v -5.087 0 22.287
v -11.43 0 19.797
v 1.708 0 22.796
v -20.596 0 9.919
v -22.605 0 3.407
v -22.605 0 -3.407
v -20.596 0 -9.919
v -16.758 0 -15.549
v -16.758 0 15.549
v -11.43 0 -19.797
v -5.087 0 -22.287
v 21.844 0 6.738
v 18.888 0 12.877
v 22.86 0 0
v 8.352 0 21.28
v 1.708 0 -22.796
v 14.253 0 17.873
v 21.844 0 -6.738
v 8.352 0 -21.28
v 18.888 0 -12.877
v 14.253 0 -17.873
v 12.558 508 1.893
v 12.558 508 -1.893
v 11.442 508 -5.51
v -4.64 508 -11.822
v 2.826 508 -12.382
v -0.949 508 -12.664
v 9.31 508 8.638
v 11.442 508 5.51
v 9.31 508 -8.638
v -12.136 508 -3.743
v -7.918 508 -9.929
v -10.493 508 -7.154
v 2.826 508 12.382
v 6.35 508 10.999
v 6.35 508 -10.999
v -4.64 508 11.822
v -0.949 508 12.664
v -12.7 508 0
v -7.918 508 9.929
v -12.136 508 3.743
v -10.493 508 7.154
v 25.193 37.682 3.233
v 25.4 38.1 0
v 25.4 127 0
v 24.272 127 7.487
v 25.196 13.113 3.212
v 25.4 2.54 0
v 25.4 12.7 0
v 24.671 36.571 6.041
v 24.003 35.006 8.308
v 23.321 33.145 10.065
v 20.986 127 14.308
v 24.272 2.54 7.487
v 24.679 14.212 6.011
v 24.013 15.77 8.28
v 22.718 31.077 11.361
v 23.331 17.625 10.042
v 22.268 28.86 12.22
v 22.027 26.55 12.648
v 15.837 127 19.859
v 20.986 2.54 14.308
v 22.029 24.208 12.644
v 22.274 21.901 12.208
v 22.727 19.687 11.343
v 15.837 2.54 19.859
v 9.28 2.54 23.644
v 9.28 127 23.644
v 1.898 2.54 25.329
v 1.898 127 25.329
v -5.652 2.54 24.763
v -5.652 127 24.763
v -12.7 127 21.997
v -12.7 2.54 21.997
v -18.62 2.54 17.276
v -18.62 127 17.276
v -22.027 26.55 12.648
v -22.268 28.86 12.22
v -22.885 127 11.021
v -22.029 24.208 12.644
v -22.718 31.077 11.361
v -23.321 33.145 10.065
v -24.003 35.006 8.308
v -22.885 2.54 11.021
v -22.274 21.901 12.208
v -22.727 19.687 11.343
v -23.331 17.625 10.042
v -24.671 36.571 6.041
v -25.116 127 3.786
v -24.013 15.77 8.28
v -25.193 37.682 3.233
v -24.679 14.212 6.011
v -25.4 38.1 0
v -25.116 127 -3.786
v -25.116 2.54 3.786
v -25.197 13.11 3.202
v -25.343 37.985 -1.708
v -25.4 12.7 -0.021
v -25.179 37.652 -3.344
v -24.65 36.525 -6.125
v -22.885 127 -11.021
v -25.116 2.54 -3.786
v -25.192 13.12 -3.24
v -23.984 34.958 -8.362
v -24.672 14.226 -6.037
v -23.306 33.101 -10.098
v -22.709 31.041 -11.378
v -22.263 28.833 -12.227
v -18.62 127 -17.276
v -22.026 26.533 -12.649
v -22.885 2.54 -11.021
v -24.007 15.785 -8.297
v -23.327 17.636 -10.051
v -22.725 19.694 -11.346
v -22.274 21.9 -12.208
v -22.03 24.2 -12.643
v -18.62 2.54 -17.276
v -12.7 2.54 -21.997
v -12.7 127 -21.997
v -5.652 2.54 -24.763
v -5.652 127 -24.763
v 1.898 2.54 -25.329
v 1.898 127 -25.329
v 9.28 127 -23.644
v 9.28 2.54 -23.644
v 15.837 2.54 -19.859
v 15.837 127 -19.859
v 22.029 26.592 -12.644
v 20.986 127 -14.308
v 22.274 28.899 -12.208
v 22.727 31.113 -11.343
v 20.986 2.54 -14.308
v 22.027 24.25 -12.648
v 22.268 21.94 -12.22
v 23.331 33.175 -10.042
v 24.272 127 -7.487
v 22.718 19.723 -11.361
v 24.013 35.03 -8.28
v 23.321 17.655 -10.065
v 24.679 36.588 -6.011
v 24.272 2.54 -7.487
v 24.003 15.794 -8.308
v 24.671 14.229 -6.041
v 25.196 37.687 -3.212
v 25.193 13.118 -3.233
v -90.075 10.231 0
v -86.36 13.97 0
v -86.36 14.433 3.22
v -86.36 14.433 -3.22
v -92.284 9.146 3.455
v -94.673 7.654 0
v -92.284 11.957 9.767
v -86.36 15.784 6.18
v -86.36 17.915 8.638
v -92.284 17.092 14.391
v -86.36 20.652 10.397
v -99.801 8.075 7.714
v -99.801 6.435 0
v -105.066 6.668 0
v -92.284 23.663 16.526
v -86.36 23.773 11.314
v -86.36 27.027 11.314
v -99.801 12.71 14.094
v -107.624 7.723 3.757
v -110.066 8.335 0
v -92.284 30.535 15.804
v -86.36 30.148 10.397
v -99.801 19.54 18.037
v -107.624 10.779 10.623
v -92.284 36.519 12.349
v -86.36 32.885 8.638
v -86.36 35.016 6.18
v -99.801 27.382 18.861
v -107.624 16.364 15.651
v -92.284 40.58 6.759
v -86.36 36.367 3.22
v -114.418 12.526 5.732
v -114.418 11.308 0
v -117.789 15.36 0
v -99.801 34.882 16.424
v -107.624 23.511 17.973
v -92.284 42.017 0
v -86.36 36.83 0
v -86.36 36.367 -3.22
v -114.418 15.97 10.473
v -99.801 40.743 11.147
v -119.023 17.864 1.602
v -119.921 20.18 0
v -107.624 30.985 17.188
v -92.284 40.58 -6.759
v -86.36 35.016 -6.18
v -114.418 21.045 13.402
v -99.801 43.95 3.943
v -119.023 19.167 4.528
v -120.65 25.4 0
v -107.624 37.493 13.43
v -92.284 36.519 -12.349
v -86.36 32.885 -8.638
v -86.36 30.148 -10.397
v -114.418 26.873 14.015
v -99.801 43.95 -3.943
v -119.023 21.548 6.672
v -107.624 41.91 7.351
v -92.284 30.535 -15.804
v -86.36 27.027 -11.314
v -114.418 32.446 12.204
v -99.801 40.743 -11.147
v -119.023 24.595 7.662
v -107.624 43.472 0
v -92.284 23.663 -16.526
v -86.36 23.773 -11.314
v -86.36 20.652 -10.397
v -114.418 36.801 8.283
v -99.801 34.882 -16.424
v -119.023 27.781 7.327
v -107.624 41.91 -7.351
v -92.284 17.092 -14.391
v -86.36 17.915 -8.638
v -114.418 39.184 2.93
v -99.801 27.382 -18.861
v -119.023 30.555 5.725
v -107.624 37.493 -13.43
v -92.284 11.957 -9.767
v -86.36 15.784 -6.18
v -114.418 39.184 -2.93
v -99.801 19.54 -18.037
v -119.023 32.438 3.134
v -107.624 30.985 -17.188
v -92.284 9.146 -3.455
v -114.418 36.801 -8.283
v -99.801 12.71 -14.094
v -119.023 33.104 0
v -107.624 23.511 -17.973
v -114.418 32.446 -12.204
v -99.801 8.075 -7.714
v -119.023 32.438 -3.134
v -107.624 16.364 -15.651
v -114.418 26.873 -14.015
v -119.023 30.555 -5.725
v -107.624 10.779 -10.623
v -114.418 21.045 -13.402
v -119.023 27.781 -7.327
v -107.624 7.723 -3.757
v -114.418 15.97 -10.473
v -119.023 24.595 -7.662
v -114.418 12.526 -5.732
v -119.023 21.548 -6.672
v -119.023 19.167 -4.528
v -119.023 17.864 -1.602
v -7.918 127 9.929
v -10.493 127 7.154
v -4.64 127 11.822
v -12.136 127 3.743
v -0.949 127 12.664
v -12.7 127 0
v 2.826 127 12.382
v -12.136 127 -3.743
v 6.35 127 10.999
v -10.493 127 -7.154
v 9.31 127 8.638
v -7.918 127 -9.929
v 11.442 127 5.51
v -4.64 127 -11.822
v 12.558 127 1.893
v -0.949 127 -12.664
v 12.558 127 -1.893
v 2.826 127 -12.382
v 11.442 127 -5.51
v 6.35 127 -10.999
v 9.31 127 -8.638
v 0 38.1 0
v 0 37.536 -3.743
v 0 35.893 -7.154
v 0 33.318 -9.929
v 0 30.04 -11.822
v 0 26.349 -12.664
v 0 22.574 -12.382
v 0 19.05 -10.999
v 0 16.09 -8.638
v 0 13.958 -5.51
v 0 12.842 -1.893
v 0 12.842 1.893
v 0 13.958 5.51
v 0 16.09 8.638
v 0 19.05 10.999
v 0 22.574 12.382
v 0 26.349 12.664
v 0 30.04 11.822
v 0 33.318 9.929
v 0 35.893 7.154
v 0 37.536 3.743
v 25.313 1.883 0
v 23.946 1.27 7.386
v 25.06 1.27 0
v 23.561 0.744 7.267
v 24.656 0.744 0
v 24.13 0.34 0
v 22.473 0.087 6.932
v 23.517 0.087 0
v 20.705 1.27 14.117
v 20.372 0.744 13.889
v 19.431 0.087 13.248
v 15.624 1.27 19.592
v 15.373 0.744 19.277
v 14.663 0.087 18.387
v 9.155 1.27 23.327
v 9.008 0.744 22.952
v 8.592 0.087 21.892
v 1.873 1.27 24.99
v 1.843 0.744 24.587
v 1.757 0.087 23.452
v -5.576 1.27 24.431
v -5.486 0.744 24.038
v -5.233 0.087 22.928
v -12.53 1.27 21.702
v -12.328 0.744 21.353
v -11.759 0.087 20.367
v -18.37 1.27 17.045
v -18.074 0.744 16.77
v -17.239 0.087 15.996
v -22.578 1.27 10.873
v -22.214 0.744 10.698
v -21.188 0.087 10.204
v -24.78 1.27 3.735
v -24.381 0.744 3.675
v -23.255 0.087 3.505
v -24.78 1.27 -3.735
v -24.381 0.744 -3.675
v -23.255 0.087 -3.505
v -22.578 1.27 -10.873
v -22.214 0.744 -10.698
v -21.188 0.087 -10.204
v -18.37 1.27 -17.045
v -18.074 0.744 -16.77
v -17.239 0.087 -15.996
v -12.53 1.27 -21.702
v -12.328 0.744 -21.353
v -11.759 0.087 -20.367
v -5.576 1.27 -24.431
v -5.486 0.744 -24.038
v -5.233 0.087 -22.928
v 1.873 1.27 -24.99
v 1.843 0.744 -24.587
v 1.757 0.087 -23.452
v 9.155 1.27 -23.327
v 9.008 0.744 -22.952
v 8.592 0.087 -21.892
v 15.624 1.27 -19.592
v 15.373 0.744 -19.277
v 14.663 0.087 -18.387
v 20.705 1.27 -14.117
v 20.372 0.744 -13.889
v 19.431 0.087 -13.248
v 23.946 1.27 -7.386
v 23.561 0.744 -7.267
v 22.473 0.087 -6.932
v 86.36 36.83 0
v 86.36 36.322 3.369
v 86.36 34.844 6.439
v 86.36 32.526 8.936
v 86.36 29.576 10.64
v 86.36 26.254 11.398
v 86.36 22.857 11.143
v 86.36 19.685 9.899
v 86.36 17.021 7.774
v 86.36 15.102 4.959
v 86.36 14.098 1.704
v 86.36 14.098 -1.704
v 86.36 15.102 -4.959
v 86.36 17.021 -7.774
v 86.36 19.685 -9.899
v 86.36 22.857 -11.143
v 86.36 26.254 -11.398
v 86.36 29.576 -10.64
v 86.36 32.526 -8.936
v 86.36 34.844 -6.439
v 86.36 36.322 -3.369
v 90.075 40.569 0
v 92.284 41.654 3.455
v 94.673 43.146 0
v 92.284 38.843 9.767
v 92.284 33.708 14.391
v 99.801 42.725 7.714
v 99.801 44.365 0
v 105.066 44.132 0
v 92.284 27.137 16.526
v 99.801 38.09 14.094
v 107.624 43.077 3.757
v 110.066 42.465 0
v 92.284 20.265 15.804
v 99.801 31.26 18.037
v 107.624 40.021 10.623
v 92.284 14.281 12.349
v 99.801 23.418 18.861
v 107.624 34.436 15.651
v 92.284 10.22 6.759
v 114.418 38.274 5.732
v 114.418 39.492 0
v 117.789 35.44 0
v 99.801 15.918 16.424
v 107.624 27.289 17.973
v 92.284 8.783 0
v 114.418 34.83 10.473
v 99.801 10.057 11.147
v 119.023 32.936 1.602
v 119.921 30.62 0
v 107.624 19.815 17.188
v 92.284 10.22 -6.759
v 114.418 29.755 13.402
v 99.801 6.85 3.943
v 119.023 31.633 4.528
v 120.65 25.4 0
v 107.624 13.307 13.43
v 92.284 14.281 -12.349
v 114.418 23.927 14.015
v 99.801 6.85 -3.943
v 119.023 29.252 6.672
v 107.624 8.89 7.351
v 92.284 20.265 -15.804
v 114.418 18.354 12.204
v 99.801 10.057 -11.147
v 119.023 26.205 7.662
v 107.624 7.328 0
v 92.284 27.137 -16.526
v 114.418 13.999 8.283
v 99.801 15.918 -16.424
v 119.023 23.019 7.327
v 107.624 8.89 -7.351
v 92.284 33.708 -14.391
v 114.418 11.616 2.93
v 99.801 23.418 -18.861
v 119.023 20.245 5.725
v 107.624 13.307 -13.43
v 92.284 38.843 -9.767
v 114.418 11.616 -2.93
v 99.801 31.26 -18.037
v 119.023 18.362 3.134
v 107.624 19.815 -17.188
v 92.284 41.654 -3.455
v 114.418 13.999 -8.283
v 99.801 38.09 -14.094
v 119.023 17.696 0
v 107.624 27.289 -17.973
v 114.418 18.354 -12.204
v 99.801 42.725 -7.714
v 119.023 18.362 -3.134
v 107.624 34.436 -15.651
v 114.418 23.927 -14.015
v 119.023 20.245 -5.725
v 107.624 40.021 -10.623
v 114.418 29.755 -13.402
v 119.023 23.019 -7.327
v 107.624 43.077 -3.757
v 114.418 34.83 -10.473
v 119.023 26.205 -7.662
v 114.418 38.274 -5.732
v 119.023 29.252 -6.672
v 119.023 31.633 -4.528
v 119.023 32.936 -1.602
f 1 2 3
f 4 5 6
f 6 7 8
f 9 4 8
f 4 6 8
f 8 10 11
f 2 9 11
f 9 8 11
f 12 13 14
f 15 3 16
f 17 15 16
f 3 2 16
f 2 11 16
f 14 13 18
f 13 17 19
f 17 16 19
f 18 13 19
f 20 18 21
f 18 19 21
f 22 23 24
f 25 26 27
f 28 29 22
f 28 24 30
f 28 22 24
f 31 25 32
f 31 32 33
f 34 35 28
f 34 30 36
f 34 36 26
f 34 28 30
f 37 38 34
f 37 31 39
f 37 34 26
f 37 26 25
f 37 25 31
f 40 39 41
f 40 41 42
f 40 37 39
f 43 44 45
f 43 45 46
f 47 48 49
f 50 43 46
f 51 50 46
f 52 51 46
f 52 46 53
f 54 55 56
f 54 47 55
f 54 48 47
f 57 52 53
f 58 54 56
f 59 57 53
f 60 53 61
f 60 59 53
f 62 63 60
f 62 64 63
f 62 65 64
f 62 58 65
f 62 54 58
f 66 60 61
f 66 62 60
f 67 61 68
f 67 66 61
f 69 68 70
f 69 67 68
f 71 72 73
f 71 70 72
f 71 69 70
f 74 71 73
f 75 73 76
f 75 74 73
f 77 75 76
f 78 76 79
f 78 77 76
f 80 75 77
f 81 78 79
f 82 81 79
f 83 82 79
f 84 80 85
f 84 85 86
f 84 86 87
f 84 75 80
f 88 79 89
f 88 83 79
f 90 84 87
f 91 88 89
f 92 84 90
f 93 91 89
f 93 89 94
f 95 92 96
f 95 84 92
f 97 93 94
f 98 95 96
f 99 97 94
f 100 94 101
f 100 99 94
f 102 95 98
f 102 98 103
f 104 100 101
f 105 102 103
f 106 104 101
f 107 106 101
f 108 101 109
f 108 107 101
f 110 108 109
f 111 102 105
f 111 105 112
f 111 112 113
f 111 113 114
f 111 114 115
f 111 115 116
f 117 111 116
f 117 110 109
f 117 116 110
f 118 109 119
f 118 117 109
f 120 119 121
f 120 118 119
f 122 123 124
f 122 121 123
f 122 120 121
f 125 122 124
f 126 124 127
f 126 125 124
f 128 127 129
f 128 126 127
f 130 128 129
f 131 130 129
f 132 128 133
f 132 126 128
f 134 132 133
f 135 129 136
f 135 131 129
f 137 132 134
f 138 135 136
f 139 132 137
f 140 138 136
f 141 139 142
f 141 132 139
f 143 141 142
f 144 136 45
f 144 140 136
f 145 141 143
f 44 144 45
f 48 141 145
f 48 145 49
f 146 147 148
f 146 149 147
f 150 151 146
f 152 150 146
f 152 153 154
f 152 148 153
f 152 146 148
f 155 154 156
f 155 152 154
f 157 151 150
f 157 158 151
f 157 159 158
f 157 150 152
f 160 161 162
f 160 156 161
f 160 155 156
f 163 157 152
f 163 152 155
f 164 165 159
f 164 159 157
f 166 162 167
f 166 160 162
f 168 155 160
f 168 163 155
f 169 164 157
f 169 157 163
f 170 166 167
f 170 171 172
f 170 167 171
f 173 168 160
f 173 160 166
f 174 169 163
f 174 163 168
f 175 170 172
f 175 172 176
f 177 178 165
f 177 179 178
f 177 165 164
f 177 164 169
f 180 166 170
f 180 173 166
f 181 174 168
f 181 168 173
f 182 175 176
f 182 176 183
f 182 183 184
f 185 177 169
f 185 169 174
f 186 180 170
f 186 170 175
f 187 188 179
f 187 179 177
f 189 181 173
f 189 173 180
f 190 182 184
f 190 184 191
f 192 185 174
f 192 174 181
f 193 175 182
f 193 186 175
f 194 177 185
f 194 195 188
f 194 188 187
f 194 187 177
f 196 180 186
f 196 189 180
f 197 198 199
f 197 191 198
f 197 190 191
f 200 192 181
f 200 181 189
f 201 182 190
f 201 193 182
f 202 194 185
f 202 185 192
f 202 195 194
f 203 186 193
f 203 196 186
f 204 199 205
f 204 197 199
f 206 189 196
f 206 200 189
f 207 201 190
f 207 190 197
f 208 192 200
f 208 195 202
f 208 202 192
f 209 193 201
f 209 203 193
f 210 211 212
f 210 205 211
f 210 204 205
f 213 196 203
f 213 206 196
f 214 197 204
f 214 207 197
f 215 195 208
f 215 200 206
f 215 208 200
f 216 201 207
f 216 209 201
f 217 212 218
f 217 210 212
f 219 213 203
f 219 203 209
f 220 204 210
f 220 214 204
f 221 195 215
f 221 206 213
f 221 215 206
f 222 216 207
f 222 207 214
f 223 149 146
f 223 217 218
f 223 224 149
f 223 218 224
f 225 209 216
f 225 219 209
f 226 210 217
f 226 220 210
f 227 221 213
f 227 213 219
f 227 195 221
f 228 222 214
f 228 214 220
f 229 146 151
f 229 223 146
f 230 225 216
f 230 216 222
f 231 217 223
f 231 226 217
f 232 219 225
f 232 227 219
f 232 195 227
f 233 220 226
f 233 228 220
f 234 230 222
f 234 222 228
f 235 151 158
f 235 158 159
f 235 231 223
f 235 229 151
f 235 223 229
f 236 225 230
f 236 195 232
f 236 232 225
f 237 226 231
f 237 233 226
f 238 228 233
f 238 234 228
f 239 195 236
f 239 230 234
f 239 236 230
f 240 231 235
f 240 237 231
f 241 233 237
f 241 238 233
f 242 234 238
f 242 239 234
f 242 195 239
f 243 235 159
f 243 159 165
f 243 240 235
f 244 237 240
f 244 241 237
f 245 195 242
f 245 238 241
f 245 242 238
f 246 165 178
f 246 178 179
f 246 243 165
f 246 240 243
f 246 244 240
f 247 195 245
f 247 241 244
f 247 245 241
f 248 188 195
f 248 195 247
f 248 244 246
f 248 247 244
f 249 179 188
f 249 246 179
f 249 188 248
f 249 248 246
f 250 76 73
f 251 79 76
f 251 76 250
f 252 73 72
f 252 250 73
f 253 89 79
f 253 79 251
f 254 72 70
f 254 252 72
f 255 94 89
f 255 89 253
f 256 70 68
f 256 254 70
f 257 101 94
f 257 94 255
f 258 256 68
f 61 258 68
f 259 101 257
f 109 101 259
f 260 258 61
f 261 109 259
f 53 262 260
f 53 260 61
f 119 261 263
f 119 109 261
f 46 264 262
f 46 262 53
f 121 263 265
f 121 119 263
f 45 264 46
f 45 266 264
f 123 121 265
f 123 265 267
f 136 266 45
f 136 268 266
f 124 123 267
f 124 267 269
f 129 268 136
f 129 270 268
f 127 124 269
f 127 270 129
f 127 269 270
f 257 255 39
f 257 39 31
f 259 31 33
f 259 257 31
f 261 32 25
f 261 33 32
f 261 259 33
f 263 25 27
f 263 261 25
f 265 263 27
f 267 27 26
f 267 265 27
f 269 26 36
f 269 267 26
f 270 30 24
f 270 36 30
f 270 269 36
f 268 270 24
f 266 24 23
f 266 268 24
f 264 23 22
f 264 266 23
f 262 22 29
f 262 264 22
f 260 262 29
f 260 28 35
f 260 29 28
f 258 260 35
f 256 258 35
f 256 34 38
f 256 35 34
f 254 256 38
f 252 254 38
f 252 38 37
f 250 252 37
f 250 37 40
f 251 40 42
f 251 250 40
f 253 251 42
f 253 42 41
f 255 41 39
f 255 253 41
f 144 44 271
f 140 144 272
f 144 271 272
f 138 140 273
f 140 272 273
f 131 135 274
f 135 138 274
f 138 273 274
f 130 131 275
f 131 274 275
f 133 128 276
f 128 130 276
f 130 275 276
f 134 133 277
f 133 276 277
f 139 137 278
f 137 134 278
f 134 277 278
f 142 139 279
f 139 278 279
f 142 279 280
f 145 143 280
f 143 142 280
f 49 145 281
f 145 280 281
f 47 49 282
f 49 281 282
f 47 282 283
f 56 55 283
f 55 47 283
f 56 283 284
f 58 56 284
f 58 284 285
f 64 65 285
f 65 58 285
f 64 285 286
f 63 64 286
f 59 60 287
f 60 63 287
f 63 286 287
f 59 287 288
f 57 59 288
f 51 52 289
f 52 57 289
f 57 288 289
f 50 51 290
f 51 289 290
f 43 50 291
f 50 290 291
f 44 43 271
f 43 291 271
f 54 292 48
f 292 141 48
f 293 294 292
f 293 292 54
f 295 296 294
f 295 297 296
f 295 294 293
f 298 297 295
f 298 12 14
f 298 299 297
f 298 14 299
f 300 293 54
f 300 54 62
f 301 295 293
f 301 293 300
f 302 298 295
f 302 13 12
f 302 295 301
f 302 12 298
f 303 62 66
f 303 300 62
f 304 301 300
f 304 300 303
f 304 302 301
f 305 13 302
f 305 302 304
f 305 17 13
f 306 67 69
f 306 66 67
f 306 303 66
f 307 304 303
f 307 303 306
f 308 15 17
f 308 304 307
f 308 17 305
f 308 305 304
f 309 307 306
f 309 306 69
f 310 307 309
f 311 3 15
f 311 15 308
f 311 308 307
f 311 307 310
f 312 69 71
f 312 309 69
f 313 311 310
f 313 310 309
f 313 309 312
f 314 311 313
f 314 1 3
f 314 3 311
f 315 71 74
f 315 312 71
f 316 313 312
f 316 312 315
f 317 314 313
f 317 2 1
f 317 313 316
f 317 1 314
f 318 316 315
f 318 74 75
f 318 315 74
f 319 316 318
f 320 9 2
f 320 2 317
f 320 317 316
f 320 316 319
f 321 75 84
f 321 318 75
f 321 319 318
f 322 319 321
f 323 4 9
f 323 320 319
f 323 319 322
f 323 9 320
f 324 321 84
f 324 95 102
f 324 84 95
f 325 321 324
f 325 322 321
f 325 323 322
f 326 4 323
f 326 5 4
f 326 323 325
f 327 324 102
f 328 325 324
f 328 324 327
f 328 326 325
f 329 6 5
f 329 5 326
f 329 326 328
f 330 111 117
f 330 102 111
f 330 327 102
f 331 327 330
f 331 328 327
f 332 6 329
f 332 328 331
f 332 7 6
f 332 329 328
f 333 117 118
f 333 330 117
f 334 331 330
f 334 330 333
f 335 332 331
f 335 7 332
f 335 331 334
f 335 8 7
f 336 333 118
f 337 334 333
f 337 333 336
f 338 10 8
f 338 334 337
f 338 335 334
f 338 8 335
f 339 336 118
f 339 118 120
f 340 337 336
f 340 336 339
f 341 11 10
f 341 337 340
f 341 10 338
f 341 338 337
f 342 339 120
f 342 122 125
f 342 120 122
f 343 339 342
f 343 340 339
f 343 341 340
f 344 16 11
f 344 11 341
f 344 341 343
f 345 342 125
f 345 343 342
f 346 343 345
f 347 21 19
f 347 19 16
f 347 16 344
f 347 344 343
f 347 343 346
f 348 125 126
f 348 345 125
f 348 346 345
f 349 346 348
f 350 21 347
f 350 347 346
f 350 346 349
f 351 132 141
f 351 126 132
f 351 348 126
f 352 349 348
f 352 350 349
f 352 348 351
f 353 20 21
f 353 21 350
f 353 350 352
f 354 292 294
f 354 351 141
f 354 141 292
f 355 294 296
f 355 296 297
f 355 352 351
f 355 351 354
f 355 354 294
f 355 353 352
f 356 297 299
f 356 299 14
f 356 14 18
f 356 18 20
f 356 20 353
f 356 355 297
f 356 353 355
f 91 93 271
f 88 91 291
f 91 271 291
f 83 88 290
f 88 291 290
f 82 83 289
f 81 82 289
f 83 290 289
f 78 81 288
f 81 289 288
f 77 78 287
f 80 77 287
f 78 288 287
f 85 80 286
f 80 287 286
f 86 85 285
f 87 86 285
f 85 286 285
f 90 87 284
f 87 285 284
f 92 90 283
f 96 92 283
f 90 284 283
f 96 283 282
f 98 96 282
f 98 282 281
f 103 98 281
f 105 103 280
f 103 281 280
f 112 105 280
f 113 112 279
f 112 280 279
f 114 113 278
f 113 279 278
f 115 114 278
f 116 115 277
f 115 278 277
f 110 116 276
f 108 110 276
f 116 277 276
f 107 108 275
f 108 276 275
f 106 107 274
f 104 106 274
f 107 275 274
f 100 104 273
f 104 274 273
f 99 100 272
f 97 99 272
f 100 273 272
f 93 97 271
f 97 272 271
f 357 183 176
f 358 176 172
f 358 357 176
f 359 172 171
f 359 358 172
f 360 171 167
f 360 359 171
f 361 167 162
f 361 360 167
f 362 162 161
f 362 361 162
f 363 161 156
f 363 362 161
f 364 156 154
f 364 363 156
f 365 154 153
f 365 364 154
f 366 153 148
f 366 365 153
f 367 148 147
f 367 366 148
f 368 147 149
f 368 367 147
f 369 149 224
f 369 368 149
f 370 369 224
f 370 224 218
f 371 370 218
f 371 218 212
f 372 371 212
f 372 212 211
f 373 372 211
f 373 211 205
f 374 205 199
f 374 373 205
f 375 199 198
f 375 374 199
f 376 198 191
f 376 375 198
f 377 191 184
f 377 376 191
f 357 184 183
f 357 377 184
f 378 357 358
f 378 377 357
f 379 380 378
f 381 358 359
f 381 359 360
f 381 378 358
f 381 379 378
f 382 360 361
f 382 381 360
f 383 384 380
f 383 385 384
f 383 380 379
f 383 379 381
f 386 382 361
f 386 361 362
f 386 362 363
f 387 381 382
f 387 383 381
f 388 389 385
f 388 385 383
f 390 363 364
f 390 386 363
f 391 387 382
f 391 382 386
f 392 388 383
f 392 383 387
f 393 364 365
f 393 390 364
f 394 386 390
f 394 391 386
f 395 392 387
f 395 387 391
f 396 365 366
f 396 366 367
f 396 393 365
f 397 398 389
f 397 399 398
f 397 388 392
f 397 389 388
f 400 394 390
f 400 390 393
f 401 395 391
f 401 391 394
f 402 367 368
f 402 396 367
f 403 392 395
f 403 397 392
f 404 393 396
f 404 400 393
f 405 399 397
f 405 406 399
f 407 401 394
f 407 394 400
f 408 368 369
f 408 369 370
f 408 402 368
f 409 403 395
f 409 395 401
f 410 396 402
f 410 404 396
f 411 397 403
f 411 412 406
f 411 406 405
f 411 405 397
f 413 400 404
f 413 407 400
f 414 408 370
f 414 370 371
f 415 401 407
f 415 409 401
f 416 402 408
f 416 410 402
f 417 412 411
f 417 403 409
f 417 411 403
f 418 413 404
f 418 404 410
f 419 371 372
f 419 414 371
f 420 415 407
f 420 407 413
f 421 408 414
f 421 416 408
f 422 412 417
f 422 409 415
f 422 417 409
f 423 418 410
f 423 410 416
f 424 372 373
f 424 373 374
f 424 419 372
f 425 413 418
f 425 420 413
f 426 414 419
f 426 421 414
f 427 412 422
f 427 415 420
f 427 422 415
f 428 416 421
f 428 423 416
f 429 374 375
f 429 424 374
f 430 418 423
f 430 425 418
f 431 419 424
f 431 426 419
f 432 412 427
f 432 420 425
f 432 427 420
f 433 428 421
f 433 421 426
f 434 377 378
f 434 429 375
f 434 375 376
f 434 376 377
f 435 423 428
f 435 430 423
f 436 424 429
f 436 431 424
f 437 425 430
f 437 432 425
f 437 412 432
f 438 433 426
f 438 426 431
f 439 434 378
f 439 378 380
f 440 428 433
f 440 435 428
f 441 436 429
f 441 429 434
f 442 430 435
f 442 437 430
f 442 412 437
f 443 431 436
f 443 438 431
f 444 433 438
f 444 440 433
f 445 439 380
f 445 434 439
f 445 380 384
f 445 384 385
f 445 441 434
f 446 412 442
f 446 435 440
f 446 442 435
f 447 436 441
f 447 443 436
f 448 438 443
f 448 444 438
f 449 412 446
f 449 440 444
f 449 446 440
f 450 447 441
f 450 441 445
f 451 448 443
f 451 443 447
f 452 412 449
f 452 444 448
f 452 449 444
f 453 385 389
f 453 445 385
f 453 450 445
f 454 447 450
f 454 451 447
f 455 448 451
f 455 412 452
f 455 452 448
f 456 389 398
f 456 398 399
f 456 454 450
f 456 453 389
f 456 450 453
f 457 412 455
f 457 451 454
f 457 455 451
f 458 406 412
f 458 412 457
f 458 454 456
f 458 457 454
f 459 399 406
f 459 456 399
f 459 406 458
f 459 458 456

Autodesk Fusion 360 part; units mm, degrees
sketch "Sketch1" plane through (0, 0, 0) normal (0, 1, 0) x (1, 0, 0)
  circle A0 centre (0, 0) radius 25.4
  dimension "d1" = 50.8
extrude "Extrude1" add sketch "Sketch1" along normal blind 127 makes body 1
sketch "Sketch3" plane through (0, 0, 0) normal (1, 0, 0) x (0, 1, 0)
  circle A0 centre (25.4, 0) radius 12.7
  dimension "d4" = 25.4
extrude "Extrude2" cut sketch "Sketch3" along normal through all and the other way through all bodies 1
sketch "Sketch4" plane through (0, 0, 0) normal (1, 0, 0) x (0, 1, 0)
  circle A0 centre (25.4, 0) radius 11.43
  dimension "d7" = 22.86
extrude "Extrude3" add sketch "Sketch4" along normal mid plane 203.2 separate body makes body 2
sphere "SpherePrimitive2" add diameter 38.1 placed x (0, -1, 0) y (0, 0, 1) z (-1, 0, 0) at (-101.6, 25.4, 0) bodies 2
sphere "SpherePrimitive1" add diameter 38.1 placed x (0, 1, 0) y (0, 0, 1) z (1, 0, 0) at (101.6, 25.4, 0) bodies 2
fillet "Fillet1" radius 2.54 1 edges at (-23.6811, 0, 9.185) on bodies 1
sketch "Sketch7" plane through (0, 127, 0) normal (0, 1, 0) x (-1, 0, 0)
  circle A0 centre (0, 0) radius 25.4
  circle A1 centre (0, 0) radius 12.7
  dimension "d14" = 25.4
extrude "Extrude4" add sketch "Sketch7" along normal blind 381 contours A1 bodies 1
thread "Thread1"
